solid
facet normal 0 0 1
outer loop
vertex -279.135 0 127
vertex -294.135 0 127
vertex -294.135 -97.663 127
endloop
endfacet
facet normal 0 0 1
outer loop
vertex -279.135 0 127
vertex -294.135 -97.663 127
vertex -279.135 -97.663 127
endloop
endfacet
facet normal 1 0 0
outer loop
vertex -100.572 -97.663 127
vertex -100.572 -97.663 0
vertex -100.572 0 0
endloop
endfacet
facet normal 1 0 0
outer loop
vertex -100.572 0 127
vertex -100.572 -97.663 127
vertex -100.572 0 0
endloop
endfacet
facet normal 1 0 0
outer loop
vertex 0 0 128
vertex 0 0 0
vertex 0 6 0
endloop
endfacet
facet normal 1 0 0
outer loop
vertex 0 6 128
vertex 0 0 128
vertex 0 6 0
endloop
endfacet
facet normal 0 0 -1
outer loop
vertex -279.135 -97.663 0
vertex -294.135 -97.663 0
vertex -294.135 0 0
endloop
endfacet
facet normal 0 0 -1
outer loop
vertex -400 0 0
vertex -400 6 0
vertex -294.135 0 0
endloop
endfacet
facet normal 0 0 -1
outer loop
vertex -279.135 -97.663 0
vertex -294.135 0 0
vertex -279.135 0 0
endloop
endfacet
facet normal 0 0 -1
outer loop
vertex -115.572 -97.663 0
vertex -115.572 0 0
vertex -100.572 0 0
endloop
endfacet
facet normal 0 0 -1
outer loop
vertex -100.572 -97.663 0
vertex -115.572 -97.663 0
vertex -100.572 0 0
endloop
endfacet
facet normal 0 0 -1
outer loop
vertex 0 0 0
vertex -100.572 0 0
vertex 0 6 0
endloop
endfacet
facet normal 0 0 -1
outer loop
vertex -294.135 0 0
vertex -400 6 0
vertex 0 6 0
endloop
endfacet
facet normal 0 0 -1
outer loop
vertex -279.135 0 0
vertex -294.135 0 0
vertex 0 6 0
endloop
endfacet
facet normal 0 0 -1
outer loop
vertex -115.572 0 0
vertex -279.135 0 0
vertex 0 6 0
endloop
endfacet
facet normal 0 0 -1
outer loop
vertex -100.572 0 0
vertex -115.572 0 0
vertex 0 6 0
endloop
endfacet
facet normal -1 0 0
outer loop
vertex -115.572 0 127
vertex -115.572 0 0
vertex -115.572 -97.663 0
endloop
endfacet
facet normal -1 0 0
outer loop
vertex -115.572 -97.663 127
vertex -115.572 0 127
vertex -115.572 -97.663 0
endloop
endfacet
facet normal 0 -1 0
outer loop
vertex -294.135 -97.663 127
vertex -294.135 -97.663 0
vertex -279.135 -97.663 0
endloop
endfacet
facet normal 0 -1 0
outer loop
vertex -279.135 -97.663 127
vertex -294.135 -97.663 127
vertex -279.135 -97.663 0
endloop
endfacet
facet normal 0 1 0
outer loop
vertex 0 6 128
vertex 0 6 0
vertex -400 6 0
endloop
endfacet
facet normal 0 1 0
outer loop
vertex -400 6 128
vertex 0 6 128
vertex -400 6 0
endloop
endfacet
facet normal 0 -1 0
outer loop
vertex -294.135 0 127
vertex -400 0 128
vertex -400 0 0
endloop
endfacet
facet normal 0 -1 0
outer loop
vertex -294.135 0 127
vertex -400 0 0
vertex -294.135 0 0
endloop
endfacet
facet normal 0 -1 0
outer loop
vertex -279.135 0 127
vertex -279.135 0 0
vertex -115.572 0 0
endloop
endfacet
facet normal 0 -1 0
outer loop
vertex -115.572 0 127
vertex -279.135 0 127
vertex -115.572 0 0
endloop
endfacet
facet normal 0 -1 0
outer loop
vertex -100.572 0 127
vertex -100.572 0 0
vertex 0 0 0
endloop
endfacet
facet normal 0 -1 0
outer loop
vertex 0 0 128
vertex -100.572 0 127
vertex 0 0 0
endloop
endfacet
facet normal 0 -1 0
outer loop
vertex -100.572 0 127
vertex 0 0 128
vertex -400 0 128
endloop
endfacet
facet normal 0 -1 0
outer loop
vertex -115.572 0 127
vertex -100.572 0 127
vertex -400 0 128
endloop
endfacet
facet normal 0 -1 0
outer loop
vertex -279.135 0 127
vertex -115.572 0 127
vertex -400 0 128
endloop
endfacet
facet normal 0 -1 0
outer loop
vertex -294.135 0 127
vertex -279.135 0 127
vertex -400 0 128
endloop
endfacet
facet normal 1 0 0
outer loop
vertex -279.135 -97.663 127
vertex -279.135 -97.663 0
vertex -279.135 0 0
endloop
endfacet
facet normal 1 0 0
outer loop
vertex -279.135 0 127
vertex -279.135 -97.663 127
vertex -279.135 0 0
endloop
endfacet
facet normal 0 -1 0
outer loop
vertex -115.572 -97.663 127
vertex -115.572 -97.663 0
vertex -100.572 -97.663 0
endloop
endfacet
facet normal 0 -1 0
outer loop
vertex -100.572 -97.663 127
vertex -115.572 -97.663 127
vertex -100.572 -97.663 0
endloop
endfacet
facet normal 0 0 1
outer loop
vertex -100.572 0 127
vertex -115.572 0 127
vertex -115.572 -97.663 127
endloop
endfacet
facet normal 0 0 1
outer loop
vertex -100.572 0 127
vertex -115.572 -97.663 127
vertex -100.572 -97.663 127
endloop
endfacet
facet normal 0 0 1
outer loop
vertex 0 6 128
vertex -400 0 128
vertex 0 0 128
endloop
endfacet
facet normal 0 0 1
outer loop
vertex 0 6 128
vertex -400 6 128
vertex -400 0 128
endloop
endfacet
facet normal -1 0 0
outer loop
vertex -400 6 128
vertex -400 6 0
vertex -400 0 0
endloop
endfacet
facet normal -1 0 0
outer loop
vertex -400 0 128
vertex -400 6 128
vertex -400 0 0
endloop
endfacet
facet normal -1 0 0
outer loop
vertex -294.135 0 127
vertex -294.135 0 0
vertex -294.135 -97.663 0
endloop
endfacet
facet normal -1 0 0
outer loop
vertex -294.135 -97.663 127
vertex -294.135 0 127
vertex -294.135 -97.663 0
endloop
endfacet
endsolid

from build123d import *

# Parameters (mm, degrees)
F0_W     = 8.9696688134
F0_H     = 6
F0_W_2   = 6.0303311866
F0_W_3   = 7.6489803101
F0_W_4   = 7.3510196899
F2_DEPTH = 128
F4_DEPTH = 127


# Not quite as in the source:
# - the program builds the solid bodies; features that only make, move or delete a surface that nothing else refers to are left out


with BuildPart() as f2:
    # F0 (on Top) → F2 (new body)
    with BuildSketch(Plane.XY):
        Polygon((-400, 0), (-294.1345971149, 0), (-294.1345971149, 6), (-299.6463162062, 6), (-311.9468285562, 6), (-322.7511938045, 6), (-335.9566328529, 6), (-348.7171674377, 6), (-362.4063217106, 6), (-376.9397732412, 6), (-400, 6), align=None)
        with Locations((-283.6194315216, 3)):
            Rectangle(F0_W, F0_H)
        with Locations((-291.1194315216, 3)):
            Rectangle(F0_W_2, F0_H)
        Polygon((-279.1345971149, 0), (-115.5724730993, 0), (-115.5724730993, 6), (-120.0142995768, 6), (-130.6865749399, 6), (-142.439753188, 6), (-152.7159749868, 6), (-164.8405666594, 6), (-175.9109262937, 6), (-188.4297876225, 6), (-205.2331021726, 6), (-216.1265840576, 6), (-227.5328489064, 6), (-240.1054796123, 6), (-251.4180912129, 6), (-260.7190593146, 6), (-272.6732546984, 6), (-279.1345971149, 6), align=None)
        with Locations((-111.7479829443, 3)):
            Rectangle(F0_W_3, F0_H)
        with Locations((-104.2479829443, 3)):
            Rectangle(F0_W_4, F0_H)
        Polygon((-100.5724730993, 0), (0, 0), (0, 6), (-21.7185619105, 6), (-32.3376952831, 6), (-47.4983571934, 6), (-60.9528624883, 6), (-73.3657559167, 6), (-83.3882540464, 6), (-97.7746488723, 6), (-100.5724730993, 6), align=None)
    extrude(amount=F2_DEPTH)

    # F0 (on Top) → F4 (join)
    with BuildSketch(Plane.XY):
        Polygon((-279.1345971149, -97.6634095667), (-279.1345971149, 0), (-288.1042659283, 0), (-294.1345971149, 0), (-294.1345971149, -97.6634095667), align=None)
        Polygon((-100.5724730993, -97.6634095667), (-100.5724730993, 0), (-107.9234927893, 0), (-115.5724730993, 0), (-115.5724730993, -97.6634095667), align=None)
    extrude(amount=F4_DEPTH)


solid = f2.part
